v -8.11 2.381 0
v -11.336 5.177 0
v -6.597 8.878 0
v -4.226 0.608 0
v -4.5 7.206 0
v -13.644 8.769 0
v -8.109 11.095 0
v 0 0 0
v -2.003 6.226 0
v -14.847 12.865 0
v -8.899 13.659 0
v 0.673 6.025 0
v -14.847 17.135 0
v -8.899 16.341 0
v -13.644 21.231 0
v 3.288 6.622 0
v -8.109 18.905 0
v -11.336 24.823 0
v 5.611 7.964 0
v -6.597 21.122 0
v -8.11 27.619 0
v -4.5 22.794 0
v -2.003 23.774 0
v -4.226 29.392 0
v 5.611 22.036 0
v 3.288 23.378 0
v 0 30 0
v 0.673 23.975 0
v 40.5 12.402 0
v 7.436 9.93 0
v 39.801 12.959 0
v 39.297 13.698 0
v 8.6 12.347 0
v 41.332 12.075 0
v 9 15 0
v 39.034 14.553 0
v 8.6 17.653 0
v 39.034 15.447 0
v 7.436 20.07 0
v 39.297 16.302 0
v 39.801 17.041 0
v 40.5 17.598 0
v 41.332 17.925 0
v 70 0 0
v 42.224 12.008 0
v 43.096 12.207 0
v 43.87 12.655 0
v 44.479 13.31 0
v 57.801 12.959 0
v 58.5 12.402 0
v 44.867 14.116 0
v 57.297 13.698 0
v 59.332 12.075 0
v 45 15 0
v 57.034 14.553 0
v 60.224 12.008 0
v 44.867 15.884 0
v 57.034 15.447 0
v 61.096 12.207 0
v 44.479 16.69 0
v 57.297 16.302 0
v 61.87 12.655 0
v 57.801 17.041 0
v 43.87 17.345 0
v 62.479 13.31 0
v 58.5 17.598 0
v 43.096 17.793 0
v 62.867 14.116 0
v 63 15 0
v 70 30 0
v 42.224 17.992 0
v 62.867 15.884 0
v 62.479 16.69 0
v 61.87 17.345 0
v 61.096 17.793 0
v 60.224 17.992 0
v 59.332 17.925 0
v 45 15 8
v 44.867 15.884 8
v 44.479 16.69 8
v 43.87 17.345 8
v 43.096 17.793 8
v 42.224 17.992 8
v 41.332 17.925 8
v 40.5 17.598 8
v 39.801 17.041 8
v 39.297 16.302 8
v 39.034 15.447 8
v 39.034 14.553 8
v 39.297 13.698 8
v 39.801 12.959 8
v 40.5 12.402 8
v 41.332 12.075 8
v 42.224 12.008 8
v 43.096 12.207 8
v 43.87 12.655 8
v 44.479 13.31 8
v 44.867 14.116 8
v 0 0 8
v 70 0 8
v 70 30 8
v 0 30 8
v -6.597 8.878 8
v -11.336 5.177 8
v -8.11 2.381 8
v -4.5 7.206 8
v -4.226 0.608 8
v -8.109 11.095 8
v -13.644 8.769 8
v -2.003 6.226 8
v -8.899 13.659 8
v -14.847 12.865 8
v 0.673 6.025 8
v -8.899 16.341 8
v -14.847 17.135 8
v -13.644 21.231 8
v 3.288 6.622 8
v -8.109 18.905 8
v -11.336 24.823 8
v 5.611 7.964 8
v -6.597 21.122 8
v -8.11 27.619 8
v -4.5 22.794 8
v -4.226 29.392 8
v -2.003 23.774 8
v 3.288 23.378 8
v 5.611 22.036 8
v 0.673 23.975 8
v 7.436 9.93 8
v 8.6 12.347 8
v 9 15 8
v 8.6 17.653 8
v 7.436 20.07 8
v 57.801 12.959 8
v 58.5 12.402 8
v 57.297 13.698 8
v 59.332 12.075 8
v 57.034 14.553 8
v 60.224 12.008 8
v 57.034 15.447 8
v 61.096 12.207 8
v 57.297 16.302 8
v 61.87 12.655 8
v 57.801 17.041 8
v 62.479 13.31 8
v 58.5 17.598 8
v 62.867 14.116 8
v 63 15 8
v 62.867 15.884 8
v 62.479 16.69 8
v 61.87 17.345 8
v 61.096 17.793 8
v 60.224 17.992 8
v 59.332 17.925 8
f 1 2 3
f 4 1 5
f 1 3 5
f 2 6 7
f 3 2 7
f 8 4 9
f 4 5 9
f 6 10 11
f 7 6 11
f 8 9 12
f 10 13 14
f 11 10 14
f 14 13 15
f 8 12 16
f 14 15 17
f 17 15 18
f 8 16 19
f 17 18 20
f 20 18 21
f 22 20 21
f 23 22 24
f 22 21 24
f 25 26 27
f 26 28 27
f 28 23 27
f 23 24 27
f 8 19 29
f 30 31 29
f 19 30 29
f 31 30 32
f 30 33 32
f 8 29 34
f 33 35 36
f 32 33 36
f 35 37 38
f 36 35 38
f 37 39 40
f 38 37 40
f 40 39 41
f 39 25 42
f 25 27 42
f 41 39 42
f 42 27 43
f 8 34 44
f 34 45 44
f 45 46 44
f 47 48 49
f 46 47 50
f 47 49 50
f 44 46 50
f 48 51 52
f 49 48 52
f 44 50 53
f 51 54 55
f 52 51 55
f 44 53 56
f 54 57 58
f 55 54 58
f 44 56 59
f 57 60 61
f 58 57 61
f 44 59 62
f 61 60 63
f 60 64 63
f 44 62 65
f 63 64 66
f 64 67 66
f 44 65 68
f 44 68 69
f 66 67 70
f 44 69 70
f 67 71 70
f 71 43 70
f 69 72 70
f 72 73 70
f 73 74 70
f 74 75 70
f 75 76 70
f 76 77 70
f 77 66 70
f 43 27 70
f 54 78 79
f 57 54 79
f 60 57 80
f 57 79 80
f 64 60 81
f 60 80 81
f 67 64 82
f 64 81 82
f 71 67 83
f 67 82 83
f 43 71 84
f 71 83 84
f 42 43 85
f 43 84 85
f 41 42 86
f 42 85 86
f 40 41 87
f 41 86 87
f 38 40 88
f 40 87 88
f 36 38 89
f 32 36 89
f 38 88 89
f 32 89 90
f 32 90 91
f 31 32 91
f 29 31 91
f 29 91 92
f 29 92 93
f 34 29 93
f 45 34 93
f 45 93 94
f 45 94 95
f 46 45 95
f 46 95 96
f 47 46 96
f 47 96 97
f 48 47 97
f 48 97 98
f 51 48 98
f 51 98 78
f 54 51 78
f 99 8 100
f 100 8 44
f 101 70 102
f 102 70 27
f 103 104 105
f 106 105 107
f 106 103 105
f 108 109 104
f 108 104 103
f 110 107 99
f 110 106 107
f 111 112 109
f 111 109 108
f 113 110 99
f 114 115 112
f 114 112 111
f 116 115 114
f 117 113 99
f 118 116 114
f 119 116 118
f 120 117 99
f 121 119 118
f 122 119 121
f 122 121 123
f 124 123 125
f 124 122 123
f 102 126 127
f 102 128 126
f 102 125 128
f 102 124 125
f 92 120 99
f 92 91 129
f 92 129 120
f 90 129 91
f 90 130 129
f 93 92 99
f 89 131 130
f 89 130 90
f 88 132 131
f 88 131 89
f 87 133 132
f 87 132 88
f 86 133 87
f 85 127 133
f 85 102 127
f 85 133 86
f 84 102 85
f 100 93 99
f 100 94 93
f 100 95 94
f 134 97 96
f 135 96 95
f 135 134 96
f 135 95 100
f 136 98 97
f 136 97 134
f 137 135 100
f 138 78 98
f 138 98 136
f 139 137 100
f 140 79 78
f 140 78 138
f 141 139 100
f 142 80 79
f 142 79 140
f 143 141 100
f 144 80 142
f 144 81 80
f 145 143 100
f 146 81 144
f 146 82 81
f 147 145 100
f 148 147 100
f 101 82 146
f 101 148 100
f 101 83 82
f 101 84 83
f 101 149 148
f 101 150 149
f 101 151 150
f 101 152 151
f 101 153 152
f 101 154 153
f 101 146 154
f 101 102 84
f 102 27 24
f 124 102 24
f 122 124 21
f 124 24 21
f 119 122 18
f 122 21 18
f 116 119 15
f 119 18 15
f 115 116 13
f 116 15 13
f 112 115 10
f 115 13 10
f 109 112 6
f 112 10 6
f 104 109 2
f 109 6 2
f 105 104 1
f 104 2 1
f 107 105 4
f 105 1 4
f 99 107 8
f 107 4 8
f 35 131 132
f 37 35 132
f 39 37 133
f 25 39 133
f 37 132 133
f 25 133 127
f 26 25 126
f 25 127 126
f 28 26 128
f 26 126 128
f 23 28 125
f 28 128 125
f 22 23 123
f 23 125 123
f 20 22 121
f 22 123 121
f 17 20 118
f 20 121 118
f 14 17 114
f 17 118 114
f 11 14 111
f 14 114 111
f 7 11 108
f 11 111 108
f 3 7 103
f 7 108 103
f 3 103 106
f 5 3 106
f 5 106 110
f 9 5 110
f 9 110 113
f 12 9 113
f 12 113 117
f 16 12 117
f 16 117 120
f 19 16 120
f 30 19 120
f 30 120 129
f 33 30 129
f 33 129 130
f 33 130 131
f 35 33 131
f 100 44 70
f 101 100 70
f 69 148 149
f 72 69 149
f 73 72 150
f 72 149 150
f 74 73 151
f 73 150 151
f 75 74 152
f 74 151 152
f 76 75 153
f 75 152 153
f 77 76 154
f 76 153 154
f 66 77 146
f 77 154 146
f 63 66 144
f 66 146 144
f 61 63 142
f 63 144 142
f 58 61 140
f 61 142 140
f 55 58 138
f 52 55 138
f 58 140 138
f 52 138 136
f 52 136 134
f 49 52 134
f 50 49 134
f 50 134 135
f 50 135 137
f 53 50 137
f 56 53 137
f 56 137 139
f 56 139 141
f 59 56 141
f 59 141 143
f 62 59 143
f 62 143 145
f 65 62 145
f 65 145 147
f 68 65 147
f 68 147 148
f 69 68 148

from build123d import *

# Parameters (mm, degrees)
BOSS_EXTRUDE1_DEPTH   = 8
CUT_EXTRUDE1_REACH    = 78.577
SKETCH2_R             = 9
F_6_0MM_DOWEL_HOLE1_D = 6


with BuildPart() as part:
    # Sketch1 → Boss-Extrude1 (new body)
    with BuildSketch(Plane.XY):
        with BuildLine():
            Line((0, 0), (70, 0))
            Line((70, 0), (70, 30))
            Line((70, 30), (0, 30))
            ThreePointArc((0, 30), (-15, 15), (0, 0))
        make_face()
    extrude(amount=BOSS_EXTRUDE1_DEPTH)

    # Sketch2 → Cut-Extrude1 (cut, up to next)
    with BuildSketch(Plane.XY.offset(8), mode=Mode.PRIVATE) as cut_extrude1_sk1:
        with Locations((0, 15)):
            Circle(SKETCH2_R)
    cut_extrude1_tool1 = extrude(cut_extrude1_sk1.sketch, amount=-CUT_EXTRUDE1_REACH, mode=Mode.PRIVATE) & part.part
    add(cut_extrude1_tool1.solids().sort_by_distance((0, 15, 8))[0], mode=Mode.SUBTRACT)

    # Ø6.0mm Dowel Hole1 (through all)
    with Locations(Plane(origin=(0, 0, 0), x_dir=(-1, 0, 0), z_dir=(0, 0, -1))):
        with Locations((-42, 15), (-60, 15)):
            Hole(F_6_0MM_DOWEL_HOLE1_D / 2)


solid = part.part
